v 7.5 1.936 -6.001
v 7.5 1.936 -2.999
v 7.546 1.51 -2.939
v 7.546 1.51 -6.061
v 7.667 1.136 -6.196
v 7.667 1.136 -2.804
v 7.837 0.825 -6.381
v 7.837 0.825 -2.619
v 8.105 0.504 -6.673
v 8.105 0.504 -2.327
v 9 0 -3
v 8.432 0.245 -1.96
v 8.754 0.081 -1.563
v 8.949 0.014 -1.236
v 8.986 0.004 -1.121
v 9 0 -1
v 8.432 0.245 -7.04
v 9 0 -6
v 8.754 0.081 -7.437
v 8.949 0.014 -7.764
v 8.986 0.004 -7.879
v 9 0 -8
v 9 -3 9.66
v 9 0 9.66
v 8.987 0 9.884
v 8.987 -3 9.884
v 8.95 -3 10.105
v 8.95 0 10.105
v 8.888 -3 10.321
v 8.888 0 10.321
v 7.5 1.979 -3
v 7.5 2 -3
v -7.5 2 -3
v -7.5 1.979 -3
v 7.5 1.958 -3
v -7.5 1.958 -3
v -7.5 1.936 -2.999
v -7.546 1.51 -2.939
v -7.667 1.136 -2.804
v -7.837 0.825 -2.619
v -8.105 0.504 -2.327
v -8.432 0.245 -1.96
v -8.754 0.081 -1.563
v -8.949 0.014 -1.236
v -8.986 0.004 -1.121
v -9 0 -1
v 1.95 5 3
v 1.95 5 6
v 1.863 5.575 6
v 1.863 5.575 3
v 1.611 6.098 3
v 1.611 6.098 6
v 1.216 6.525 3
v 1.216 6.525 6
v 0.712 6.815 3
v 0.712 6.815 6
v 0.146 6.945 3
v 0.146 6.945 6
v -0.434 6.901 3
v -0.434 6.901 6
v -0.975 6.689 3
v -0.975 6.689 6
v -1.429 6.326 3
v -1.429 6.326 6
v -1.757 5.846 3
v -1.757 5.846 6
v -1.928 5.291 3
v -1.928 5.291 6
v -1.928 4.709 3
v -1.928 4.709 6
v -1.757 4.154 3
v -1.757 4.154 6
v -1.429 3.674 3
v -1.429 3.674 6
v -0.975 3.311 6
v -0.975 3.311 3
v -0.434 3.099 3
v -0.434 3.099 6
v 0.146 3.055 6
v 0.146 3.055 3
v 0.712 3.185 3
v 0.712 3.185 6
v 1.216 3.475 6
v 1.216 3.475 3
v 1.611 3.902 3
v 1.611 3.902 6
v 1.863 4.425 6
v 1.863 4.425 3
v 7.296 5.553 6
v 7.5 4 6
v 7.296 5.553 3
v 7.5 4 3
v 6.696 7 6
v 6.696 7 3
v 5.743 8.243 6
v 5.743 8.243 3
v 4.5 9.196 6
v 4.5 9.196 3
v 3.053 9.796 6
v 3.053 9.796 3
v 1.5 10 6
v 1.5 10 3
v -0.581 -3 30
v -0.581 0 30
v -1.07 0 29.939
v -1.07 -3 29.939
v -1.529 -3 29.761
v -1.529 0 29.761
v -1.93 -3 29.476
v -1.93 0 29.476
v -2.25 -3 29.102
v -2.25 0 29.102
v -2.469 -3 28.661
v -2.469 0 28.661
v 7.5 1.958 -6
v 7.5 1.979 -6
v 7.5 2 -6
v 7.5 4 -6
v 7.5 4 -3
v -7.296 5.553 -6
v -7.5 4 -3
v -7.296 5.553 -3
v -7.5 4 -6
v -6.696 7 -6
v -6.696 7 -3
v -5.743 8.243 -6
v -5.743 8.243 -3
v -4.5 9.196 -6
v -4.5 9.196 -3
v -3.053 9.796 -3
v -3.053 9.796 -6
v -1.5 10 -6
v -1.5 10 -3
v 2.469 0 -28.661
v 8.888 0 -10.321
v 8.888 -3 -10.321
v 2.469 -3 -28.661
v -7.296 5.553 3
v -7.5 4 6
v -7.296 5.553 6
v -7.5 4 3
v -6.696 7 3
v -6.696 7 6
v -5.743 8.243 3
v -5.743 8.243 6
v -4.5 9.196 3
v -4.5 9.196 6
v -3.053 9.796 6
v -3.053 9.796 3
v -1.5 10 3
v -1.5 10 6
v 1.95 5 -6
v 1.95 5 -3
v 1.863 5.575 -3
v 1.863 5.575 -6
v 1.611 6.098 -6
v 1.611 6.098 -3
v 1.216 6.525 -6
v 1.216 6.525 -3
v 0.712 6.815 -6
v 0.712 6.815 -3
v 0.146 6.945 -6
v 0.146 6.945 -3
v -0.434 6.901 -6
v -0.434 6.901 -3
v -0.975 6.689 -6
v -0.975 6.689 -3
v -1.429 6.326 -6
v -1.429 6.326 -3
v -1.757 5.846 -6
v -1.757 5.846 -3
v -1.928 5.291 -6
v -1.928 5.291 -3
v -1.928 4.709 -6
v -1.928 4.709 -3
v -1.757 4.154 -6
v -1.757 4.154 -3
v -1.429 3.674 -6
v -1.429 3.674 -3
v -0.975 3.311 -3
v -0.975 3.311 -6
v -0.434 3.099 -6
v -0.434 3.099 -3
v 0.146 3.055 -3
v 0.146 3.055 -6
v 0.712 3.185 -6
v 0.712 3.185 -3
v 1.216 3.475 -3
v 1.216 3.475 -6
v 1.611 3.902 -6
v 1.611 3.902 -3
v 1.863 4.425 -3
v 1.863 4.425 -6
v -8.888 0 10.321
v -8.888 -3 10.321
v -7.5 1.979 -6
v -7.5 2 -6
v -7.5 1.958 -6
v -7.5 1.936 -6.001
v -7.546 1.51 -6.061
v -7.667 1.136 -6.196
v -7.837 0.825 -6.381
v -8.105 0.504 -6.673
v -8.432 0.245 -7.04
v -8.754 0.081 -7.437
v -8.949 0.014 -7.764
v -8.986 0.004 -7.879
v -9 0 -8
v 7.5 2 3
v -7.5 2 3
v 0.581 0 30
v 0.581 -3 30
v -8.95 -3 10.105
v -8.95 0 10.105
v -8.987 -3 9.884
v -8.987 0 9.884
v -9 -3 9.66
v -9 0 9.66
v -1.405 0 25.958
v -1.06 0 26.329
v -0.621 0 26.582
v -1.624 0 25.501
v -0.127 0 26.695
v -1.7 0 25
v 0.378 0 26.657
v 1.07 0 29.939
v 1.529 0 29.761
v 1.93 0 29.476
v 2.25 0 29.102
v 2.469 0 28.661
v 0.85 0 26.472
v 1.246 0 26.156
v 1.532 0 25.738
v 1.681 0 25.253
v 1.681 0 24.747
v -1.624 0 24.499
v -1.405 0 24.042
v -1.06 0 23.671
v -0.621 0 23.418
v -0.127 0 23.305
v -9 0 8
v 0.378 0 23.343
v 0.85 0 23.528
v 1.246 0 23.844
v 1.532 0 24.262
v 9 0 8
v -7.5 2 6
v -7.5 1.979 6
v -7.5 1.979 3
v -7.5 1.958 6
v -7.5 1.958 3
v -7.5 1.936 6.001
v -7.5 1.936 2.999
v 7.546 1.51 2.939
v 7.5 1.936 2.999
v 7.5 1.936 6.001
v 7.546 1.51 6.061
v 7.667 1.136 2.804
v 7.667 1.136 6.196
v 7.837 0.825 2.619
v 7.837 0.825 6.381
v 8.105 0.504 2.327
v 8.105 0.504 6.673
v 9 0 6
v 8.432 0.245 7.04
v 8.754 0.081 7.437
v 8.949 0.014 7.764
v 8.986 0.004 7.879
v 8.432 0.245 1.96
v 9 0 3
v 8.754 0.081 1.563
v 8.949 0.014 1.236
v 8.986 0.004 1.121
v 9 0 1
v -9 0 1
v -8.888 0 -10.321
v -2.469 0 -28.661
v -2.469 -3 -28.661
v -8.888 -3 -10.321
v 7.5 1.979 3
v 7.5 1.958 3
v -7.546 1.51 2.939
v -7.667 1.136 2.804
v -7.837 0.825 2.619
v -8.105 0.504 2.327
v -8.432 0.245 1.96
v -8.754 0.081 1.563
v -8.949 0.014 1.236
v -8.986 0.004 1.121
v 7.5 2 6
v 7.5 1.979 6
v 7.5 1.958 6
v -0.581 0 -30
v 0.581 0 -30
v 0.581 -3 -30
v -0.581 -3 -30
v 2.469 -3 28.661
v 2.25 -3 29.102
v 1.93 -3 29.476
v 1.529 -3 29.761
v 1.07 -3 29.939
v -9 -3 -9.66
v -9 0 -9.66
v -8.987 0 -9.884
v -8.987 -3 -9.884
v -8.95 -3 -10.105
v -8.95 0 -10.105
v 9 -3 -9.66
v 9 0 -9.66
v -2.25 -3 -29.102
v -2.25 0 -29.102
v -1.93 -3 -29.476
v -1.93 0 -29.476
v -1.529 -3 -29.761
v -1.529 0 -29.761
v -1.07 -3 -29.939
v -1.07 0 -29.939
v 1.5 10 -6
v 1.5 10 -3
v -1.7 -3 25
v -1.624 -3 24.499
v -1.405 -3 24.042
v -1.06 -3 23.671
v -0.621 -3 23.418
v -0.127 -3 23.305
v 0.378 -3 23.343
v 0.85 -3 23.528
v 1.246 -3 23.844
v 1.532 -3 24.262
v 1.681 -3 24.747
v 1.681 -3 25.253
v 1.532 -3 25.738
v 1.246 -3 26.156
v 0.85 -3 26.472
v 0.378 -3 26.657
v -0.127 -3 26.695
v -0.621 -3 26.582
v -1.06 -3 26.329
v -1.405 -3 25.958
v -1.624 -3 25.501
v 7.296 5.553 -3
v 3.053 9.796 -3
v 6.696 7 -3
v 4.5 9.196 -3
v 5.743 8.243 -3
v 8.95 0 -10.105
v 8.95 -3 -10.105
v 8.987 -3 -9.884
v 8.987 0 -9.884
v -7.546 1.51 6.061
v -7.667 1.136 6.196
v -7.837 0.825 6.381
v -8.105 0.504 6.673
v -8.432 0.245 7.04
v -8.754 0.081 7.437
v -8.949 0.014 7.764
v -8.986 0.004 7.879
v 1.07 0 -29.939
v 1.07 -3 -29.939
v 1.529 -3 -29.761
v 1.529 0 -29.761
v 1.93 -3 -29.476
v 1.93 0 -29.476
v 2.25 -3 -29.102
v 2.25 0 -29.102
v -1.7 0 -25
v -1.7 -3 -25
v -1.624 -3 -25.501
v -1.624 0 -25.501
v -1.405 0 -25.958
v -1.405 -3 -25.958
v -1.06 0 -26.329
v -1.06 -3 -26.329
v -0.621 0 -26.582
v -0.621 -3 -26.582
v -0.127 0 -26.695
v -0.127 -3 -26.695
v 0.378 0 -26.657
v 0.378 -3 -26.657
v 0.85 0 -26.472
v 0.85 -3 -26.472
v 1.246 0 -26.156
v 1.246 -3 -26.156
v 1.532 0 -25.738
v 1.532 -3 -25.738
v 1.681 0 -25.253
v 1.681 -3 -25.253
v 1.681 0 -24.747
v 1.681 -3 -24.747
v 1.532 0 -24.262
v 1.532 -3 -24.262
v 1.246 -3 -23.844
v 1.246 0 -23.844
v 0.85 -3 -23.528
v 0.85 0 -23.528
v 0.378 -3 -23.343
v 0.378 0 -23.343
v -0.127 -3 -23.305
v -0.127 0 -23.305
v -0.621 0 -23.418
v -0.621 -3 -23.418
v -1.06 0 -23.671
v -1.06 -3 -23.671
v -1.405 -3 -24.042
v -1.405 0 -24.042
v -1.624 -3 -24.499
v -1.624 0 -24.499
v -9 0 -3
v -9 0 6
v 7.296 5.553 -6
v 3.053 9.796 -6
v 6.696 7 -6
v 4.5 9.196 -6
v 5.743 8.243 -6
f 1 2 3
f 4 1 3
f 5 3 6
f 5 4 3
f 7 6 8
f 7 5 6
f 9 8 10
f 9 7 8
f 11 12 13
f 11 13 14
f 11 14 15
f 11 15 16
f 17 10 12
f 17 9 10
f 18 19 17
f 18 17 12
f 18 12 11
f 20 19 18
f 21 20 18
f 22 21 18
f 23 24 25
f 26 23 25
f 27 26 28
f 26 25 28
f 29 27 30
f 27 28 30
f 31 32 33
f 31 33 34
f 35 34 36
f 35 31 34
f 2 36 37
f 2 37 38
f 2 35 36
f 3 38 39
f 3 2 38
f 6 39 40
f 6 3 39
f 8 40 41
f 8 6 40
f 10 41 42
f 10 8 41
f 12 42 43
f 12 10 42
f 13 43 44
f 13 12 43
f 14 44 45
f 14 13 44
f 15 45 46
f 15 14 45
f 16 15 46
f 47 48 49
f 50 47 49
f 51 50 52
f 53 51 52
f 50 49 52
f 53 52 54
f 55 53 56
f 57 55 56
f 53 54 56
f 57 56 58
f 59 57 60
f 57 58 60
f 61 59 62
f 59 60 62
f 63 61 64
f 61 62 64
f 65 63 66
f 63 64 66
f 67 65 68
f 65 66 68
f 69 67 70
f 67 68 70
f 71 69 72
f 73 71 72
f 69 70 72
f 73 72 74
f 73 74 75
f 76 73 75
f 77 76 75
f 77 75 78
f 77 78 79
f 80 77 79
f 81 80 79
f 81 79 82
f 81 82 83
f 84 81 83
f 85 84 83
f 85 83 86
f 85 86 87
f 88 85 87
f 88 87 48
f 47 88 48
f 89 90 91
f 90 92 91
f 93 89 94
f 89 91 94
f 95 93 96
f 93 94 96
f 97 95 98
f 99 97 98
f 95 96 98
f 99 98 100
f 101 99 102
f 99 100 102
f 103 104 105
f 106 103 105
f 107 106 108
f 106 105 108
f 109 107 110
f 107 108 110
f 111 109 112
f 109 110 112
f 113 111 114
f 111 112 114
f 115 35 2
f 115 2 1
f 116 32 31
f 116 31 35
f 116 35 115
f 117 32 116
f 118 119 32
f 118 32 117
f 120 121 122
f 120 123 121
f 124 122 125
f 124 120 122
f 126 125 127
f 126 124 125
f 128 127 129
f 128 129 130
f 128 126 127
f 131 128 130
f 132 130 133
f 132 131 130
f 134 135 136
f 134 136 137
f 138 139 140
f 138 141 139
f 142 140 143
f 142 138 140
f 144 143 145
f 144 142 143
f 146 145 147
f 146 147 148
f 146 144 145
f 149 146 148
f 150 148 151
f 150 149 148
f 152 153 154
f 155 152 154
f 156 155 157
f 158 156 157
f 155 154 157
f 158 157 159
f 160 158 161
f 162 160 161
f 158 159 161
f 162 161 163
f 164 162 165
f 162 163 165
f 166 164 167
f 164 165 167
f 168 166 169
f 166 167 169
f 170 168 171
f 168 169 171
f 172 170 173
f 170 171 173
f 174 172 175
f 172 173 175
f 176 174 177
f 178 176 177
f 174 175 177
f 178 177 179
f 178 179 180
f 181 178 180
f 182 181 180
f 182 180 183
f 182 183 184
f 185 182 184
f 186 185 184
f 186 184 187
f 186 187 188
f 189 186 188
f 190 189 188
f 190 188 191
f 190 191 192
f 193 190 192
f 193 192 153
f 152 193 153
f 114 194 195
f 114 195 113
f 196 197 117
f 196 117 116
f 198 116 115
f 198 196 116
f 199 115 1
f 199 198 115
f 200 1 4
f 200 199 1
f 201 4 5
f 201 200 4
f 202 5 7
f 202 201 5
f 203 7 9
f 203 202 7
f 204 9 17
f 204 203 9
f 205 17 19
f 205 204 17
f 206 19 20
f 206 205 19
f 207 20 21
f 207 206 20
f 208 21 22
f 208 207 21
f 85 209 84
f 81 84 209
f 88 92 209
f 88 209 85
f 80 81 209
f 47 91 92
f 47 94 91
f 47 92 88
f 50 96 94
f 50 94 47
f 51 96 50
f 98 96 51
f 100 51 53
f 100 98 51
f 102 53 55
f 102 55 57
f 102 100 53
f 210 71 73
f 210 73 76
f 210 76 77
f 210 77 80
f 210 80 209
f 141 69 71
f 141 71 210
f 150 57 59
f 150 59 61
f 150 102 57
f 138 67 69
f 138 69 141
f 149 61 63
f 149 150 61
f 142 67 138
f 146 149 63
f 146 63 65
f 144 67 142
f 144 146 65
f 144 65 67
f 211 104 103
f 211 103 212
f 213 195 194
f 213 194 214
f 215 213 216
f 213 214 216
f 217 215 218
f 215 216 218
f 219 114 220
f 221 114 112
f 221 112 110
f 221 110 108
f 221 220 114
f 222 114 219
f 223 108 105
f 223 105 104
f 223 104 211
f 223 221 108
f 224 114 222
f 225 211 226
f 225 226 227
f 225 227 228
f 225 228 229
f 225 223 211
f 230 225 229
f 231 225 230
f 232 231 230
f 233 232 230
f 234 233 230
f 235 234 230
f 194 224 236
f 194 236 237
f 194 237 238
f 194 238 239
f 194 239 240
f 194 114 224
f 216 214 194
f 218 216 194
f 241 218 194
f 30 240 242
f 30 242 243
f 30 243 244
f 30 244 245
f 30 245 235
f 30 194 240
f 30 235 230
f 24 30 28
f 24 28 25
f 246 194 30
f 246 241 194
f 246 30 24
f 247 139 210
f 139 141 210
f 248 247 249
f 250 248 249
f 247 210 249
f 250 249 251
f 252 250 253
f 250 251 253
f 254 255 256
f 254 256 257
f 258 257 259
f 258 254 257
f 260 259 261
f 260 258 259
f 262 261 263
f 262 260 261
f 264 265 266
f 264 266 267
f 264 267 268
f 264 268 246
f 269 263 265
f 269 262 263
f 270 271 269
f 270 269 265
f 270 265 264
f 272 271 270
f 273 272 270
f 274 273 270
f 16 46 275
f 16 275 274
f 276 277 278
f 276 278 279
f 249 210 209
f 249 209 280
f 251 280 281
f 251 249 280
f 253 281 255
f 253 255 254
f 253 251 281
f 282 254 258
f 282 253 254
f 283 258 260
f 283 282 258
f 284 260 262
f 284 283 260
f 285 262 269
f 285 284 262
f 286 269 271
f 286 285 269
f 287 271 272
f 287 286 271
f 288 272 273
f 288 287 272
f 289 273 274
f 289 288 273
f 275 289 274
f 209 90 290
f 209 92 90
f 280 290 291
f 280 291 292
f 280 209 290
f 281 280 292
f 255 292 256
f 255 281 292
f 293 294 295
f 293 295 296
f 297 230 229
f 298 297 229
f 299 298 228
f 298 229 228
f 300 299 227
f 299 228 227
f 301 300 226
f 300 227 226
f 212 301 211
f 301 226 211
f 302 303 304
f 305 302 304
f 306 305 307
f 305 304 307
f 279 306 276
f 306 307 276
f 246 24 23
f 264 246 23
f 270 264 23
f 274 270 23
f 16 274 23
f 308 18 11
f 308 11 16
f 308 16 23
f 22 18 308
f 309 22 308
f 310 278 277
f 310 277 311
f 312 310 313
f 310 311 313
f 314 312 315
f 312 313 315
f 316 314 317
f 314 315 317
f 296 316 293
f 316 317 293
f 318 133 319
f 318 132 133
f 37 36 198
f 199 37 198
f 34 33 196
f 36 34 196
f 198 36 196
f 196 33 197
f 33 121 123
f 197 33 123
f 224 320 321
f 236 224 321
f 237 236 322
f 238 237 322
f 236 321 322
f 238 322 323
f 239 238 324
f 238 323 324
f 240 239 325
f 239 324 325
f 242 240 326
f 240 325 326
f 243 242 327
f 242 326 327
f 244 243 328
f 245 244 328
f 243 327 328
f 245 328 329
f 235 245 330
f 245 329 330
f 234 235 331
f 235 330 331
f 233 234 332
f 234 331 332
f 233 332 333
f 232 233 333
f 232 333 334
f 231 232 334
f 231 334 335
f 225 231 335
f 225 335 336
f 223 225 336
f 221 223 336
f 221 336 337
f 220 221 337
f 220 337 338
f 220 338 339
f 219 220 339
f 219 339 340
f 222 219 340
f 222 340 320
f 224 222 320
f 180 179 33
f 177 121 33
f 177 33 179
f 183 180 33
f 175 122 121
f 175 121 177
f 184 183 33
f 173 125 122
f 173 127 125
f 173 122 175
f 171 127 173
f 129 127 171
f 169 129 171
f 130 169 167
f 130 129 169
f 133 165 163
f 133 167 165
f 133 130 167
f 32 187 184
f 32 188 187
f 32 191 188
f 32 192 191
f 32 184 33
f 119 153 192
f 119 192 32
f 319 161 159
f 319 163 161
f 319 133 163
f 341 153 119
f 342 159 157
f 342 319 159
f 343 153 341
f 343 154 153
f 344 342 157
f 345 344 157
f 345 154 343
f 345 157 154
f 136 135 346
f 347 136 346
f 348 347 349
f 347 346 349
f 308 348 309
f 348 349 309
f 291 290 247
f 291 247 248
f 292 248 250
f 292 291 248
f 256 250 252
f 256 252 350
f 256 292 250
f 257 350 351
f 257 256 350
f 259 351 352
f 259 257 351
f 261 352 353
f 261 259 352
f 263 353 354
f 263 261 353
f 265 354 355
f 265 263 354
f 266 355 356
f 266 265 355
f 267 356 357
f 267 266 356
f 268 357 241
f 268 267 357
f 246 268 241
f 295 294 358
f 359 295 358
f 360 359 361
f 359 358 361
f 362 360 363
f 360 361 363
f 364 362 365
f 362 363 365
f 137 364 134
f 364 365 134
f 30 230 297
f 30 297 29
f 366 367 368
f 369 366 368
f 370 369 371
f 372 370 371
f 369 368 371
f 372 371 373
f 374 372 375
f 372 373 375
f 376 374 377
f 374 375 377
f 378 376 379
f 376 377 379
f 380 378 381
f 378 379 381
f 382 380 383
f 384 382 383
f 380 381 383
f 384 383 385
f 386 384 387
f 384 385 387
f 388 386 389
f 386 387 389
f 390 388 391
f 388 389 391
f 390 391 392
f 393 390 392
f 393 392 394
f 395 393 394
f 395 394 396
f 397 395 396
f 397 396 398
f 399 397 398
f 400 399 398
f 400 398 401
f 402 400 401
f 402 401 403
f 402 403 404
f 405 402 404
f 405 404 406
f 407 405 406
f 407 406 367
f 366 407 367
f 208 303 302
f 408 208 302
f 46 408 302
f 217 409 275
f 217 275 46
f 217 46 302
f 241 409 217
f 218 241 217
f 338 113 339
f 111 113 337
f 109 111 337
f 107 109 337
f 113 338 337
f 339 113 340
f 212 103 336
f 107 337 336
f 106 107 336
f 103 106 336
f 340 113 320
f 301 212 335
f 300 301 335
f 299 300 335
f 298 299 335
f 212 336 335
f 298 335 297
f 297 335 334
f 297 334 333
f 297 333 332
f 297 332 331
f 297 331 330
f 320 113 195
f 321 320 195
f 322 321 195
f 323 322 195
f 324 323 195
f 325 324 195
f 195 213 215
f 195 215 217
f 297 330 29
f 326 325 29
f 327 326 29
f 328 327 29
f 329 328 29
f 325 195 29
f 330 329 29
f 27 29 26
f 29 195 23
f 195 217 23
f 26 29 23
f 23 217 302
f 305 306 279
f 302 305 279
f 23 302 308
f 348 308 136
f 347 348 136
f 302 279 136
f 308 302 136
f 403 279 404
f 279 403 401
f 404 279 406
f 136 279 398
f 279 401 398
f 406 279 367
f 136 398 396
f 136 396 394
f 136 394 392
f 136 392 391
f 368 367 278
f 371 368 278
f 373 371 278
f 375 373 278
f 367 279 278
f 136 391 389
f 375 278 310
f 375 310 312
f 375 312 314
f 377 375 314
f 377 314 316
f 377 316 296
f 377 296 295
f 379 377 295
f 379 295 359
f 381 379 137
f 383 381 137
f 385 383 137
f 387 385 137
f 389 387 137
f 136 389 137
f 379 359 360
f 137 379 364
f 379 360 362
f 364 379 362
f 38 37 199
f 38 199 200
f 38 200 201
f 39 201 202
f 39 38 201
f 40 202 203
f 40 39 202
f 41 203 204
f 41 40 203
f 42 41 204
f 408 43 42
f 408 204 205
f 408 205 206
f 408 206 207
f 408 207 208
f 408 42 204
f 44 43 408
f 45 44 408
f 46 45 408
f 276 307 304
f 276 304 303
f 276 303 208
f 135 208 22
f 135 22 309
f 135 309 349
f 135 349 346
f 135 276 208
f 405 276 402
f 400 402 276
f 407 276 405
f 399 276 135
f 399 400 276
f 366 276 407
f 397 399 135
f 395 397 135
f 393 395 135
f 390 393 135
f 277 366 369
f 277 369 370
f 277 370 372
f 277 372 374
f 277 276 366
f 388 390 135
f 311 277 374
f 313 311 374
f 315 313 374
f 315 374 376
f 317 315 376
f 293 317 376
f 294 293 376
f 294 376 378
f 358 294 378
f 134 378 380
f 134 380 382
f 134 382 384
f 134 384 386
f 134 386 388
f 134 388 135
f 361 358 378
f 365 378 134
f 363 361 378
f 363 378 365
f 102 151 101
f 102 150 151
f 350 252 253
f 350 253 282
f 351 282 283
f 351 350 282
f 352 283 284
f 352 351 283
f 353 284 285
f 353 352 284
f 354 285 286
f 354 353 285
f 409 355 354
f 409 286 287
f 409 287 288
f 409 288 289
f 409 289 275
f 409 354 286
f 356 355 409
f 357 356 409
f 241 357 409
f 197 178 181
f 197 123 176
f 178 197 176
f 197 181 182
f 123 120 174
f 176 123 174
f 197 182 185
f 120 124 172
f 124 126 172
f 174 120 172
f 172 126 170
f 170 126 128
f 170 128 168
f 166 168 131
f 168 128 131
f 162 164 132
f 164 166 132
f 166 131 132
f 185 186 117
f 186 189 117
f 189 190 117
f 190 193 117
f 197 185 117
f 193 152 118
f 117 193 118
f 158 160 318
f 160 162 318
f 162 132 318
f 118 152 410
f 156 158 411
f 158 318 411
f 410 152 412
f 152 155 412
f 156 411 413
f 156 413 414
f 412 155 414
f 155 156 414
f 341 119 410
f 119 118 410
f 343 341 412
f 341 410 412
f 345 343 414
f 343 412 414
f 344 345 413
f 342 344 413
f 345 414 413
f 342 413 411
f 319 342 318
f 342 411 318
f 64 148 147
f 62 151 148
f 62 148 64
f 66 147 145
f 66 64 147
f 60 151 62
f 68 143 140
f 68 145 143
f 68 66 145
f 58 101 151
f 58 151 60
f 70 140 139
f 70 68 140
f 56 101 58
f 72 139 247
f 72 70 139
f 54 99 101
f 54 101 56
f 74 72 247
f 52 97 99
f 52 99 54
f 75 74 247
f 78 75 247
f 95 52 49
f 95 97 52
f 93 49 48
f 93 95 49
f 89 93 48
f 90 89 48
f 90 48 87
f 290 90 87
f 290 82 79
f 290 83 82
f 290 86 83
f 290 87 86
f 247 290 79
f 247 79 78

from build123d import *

# Parameters (mm, degrees)
EXTRUDE_1_DEPTH      = 3
SKETCH_2_W           = 15
SKETCH_2_H           = 3
EXTRUDE_2_DEPTH      = 10
FILLET_1_R           = 6
FILLET_2_R           = 2
HOLE_WIZARD_M3_1_D   = 3.4
HOLE_WIZARD_M3_5_1_D = 3.9


with BuildPart() as part:
    # 草图1 → 凸台-拉伸1 (new body)
    with BuildSketch(Plane(origin=(0, 0, 0), x_dir=(1, 0, 0), z_dir=(0, 1, 0))):
        Polygon((9, 10), (2, 30), (-2, 30), (-9, 10), (-9, -10), (-2, -30), (2, -30), (9, -10), align=None)
    extrude(amount=-EXTRUDE_1_DEPTH)

    # 草图2 → 凸台-拉伸2 (add)
    with BuildSketch(Plane(origin=(0, 0, 0), x_dir=(1, 0, 0), z_dir=(0, 1, 0))):
        with Locations((0, 4.5)):
            Rectangle(SKETCH_2_W, SKETCH_2_H)
        with Locations((0, -4.5)):
            Rectangle(SKETCH_2_W, SKETCH_2_H)
    extrude(amount=EXTRUDE_2_DEPTH)

    # 圆角1
    fillet_1_edges = [part.edges().sort_by_distance(p)[0] for p in [
        (-7.5, 10, -4.5),
        (7.5, 10, -4.5),
        (-7.5, 10, 4.5),
        (7.5, 10, 4.5),
    ]]
    fillet(fillet_1_edges, radius=FILLET_1_R)

    # 圆角2
    # the kernel refuses this fillet: 2 mm, written as the material it adds along each edge
    with BuildSketch(Plane(origin=(-7.5, 0, -3), x_dir=(-1, 0, 0), z_dir=(0, 0, -1)), Plane(origin=(7.5, 0, -6), x_dir=(1, 0, 0), z_dir=(0, 0, 1)), Plane(origin=(7.5, 0, 3), x_dir=(1, 0, 0), z_dir=(0, 0, 1))) as fillet_2_piece_1:
        with BuildLine():
            CenterArc((2, 1.936491673), FILLET_2_R, 180, 75.522487814)
            Line((0, 1.936491673), (0, 0))
            Line((0, 0), (1.5, 0))
        make_face()
    extrude(amount=3)
    with BuildSketch(Plane(origin=(7.5, 0, -3), x_dir=(0, 0, 1), z_dir=(-1, 0, 0)), Plane(origin=(-7.5, 0, -6), x_dir=(0, 0, -1), z_dir=(1, 0, 0)), Plane(origin=(-7.5, 0, 3), x_dir=(0, 0, -1), z_dir=(1, 0, 0))) as fillet_2_piece_2:
        with BuildLine():
            CenterArc((FILLET_2_R, FILLET_2_R), FILLET_2_R, 180, 90)
            Line((0, FILLET_2_R), (0, 0))
            Line((0, 0), (FILLET_2_R, 0))
        make_face()
    extrude(amount=15)
    with BuildSketch(Plane(origin=(-7.5, 0, 6), x_dir=(0, 1, 0), z_dir=(0, 0, -1))) as fillet_2_piece_3:
        with BuildLine():
            CenterArc((1.936491673, -2), FILLET_2_R, 90, 75.522487814)
            Line((0, -1.5), (0, 0))
            Line((0, 0), (1.936491673, 0))
        make_face()
    extrude(amount=3)
    with BuildSketch(Plane(origin=(7.5, 0, 6), x_dir=(0, 1, 0), z_dir=(-1, 0, 0))) as fillet_2_piece_4:
        with BuildLine():
            CenterArc((FILLET_2_R, -FILLET_2_R), FILLET_2_R, 90, 90)
            Line((0, -FILLET_2_R), (0, 0))
            Line((0, 0), (FILLET_2_R, 0))
        make_face()
    extrude(amount=15)
    with BuildSketch(Plane(origin=(-7.5, 0, 1.841229183), x_dir=(-1, 0, 0), z_dir=(0, 0, -1))) as fillet_2_piece_5a_section:
        with BuildLine():
            CenterArc((2, 1.936491673), FILLET_2_R, 180, 75.522487814)
            Line((0, 1.936491673), (0, 0))
            Line((0, 0), (1.5, 0))
        make_face()
    fillet_2_piece_5a = extrude(amount=7.841229183, mode=Mode.PRIVATE)
    fillet_2_piece_5a = split(fillet_2_piece_5a, bisect_by=Plane(origin=(-7.5, 0, -3), z_dir=(0, 0, 1)), keep=Keep.TOP, mode=Mode.PRIVATE)
    with BuildSketch(Plane(origin=(7.5, 0, -3), x_dir=(0, 0, 1), z_dir=(-1, 0, 0))) as fillet_2_piece_5b_section:
        with BuildLine():
            CenterArc((FILLET_2_R, FILLET_2_R), FILLET_2_R, 180, 90)
            Line((0, FILLET_2_R), (0, 0))
            Line((0, 0), (FILLET_2_R, 0))
        make_face()
    fillet_2_piece_5b = extrude(amount=20, mode=Mode.PRIVATE)
    fillet_2_piece_5b = split(fillet_2_piece_5b, bisect_by=Plane(origin=(-9, 0, -3), z_dir=(1, 0, 0)), keep=Keep.TOP, mode=Mode.PRIVATE)
    fillet_2_piece_5b = split(fillet_2_piece_5b, bisect_by=Plane(origin=(-7.5, 0, -3), z_dir=(-1, 0, 0)), keep=Keep.TOP, mode=Mode.PRIVATE)
    fillet_2_piece_5 = fillet_2_piece_5a & fillet_2_piece_5b
    add(fillet_2_piece_5)
    with BuildSketch(Plane(origin=(-7.5, 0, -3), x_dir=(-1, 0, 0), z_dir=(0, 0, -1))) as fillet_2_piece_6a_section:
        with BuildLine():
            CenterArc((2, 1.936491673), FILLET_2_R, 180, 75.522487814)
            Line((0, 1.936491673), (0, 0))
            Line((0, 0), (1.5, 0))
        make_face()
    fillet_2_piece_6a = extrude(amount=7.841229183, mode=Mode.PRIVATE)
    fillet_2_piece_6a = split(fillet_2_piece_6a, bisect_by=Plane(origin=(-11.018930958, 0, -4.231625835), z_dir=(0.9438583563660174, 0, 0.3303504247281063)), keep=Keep.TOP, mode=Mode.PRIVATE)
    fillet_2_piece_6a = split(fillet_2_piece_6a, bisect_by=Plane(origin=(-7.5, 0, -6), z_dir=(0, 0, -1)), keep=Keep.TOP, mode=Mode.PRIVATE)
    with BuildSketch(Plane(origin=(-12.5, 0, -6), x_dir=(0, 0, -1), z_dir=(1, 0, 0))) as fillet_2_piece_6b_section:
        with BuildLine():
            CenterArc((FILLET_2_R, FILLET_2_R), FILLET_2_R, 180, 90)
            Line((0, FILLET_2_R), (0, 0))
            Line((0, 0), (FILLET_2_R, 0))
        make_face()
    fillet_2_piece_6b = extrude(amount=20, mode=Mode.PRIVATE)
    fillet_2_piece_6b = split(fillet_2_piece_6b, bisect_by=Plane(origin=(-9, 0, -6), z_dir=(1, 0, 0)), keep=Keep.TOP, mode=Mode.PRIVATE)
    fillet_2_piece_6b = split(fillet_2_piece_6b, bisect_by=Plane(origin=(-7.5, 0, -6), z_dir=(-1, 0, 0)), keep=Keep.TOP, mode=Mode.PRIVATE)
    fillet_2_piece_6 = fillet_2_piece_6a & fillet_2_piece_6b
    add(fillet_2_piece_6)
    with BuildSketch(Plane(origin=(12.5, 0, -3), x_dir=(0, 0, 1), z_dir=(-1, 0, 0))) as fillet_2_piece_7a_section:
        with BuildLine():
            CenterArc((FILLET_2_R, FILLET_2_R), FILLET_2_R, 180, 90)
            Line((0, FILLET_2_R), (0, 0))
            Line((0, 0), (FILLET_2_R, 0))
        make_face()
    fillet_2_piece_7a = extrude(amount=20, mode=Mode.PRIVATE)
    fillet_2_piece_7a = split(fillet_2_piece_7a, bisect_by=Plane(origin=(9, 0, -3), z_dir=(-1, 0, 0)), keep=Keep.TOP, mode=Mode.PRIVATE)
    fillet_2_piece_7a = split(fillet_2_piece_7a, bisect_by=Plane(origin=(7.5, 0, -3), z_dir=(1, 0, 0)), keep=Keep.TOP, mode=Mode.PRIVATE)
    with BuildSketch(Plane(origin=(7.5, 0, -6), x_dir=(1, 0, 0), z_dir=(0, 0, 1))) as fillet_2_piece_7b_section:
        with BuildLine():
            CenterArc((2, 1.936491673), FILLET_2_R, 180, 75.522487814)
            Line((0, 1.936491673), (0, 0))
            Line((0, 0), (1.5, 0))
        make_face()
    fillet_2_piece_7b = extrude(amount=7.841229183, mode=Mode.PRIVATE)
    fillet_2_piece_7b = split(fillet_2_piece_7b, bisect_by=Plane(origin=(7.5, 0, -3), z_dir=(0, 0, 1)), keep=Keep.TOP, mode=Mode.PRIVATE)
    fillet_2_piece_7 = fillet_2_piece_7a & fillet_2_piece_7b
    add(fillet_2_piece_7)
    with BuildSketch(Plane(origin=(7.5, 0, -10.841229183), x_dir=(1, 0, 0), z_dir=(0, 0, 1))) as fillet_2_piece_8a_section:
        with BuildLine():
            CenterArc((2, 1.936491673), FILLET_2_R, 180, 75.522487814)
            Line((0, 1.936491673), (0, 0))
            Line((0, 0), (1.5, 0))
        make_face()
    fillet_2_piece_8a = extrude(amount=7.841229183, mode=Mode.PRIVATE)
    fillet_2_piece_8a = split(fillet_2_piece_8a, bisect_by=Plane(origin=(8.574004264, 0, -11.217130675), z_dir=(-0.9438583563660174, 0, 0.3303504247281061)), keep=Keep.TOP, mode=Mode.PRIVATE)
    fillet_2_piece_8a = split(fillet_2_piece_8a, bisect_by=Plane(origin=(7.5, 0, -6), z_dir=(0, 0, -1)), keep=Keep.TOP, mode=Mode.PRIVATE)
    with BuildSketch(Plane(origin=(-7.5, 0, -6), x_dir=(0, 0, -1), z_dir=(1, 0, 0))) as fillet_2_piece_8b_section:
        with BuildLine():
            CenterArc((FILLET_2_R, FILLET_2_R), FILLET_2_R, 180, 90)
            Line((0, FILLET_2_R), (0, 0))
            Line((0, 0), (FILLET_2_R, 0))
        make_face()
    fillet_2_piece_8b = extrude(amount=20, mode=Mode.PRIVATE)
    fillet_2_piece_8b = split(fillet_2_piece_8b, bisect_by=Plane(origin=(9, 0, -6), z_dir=(-1, 0, 0)), keep=Keep.TOP, mode=Mode.PRIVATE)
    fillet_2_piece_8b = split(fillet_2_piece_8b, bisect_by=Plane(origin=(7.5, 0, -6), z_dir=(1, 0, 0)), keep=Keep.TOP, mode=Mode.PRIVATE)
    fillet_2_piece_8 = fillet_2_piece_8a & fillet_2_piece_8b
    add(fillet_2_piece_8)
    with BuildSketch(Plane(origin=(-7.5, 0, 10.841229183), x_dir=(0, 1, 0), z_dir=(0, 0, -1))) as fillet_2_piece_9a_section:
        with BuildLine():
            CenterArc((1.936491673, -2), FILLET_2_R, 90, 75.522487814)
            Line((0, -1.5), (0, 0))
            Line((0, 0), (1.936491673, 0))
        make_face()
    fillet_2_piece_9a = extrude(amount=7.841229183, mode=Mode.PRIVATE)
    fillet_2_piece_9a = split(fillet_2_piece_9a, bisect_by=Plane(origin=(-7.5, 0, 6), z_dir=(0, 0, 1)), keep=Keep.TOP, mode=Mode.PRIVATE)
    fillet_2_piece_9a = split(fillet_2_piece_9a, bisect_by=Plane(origin=(-8.574004264, 0, 11.217130675), z_dir=(0.9438583563660174, 0, -0.33035042472810616)), keep=Keep.TOP, mode=Mode.PRIVATE)
    with BuildSketch(Plane(origin=(7.5, 0, 6), x_dir=(0, 1, 0), z_dir=(-1, 0, 0))) as fillet_2_piece_9b_section:
        with BuildLine():
            CenterArc((FILLET_2_R, -FILLET_2_R), FILLET_2_R, 90, 90)
            Line((0, -FILLET_2_R), (0, 0))
            Line((0, 0), (FILLET_2_R, 0))
        make_face()
    fillet_2_piece_9b = extrude(amount=20, mode=Mode.PRIVATE)
    fillet_2_piece_9b = split(fillet_2_piece_9b, bisect_by=Plane(origin=(-7.5, 0, 6), z_dir=(-1, 0, 0)), keep=Keep.TOP, mode=Mode.PRIVATE)
    fillet_2_piece_9b = split(fillet_2_piece_9b, bisect_by=Plane(origin=(-9, 0, 6), z_dir=(1, 0, 0)), keep=Keep.TOP, mode=Mode.PRIVATE)
    fillet_2_piece_9 = fillet_2_piece_9a & fillet_2_piece_9b
    add(fillet_2_piece_9)
    with BuildSketch(Plane(origin=(-7.5, 0, 6), x_dir=(0, 1, 0), z_dir=(0, 0, -1))) as fillet_2_piece_10a_section:
        with BuildLine():
            CenterArc((1.936491673, -2), FILLET_2_R, 90, 75.522487814)
            Line((0, -1.5), (0, 0))
            Line((0, 0), (1.936491673, 0))
        make_face()
    fillet_2_piece_10a = extrude(amount=7.841229183, mode=Mode.PRIVATE)
    fillet_2_piece_10a = split(fillet_2_piece_10a, bisect_by=Plane(origin=(-7.5, 0, 3), z_dir=(0, 0, -1)), keep=Keep.TOP, mode=Mode.PRIVATE)
    with BuildSketch(Plane(origin=(-12.5, 0, 3), x_dir=(0, 0, -1), z_dir=(1, 0, 0))) as fillet_2_piece_10b_section:
        with BuildLine():
            CenterArc((FILLET_2_R, FILLET_2_R), FILLET_2_R, 180, 90)
            Line((0, FILLET_2_R), (0, 0))
            Line((0, 0), (FILLET_2_R, 0))
        make_face()
    fillet_2_piece_10b = extrude(amount=20, mode=Mode.PRIVATE)
    fillet_2_piece_10b = split(fillet_2_piece_10b, bisect_by=Plane(origin=(-7.5, 0, 3), z_dir=(-1, 0, 0)), keep=Keep.TOP, mode=Mode.PRIVATE)
    fillet_2_piece_10b = split(fillet_2_piece_10b, bisect_by=Plane(origin=(-9, 0, 3), z_dir=(1, 0, 0)), keep=Keep.TOP, mode=Mode.PRIVATE)
    fillet_2_piece_10 = fillet_2_piece_10a & fillet_2_piece_10b
    add(fillet_2_piece_10)
    with BuildSketch(Plane(origin=(12.5, 0, 6), x_dir=(0, 1, 0), z_dir=(-1, 0, 0))) as fillet_2_piece_11a_section:
        with BuildLine():
            CenterArc((FILLET_2_R, -FILLET_2_R), FILLET_2_R, 90, 90)
            Line((0, -FILLET_2_R), (0, 0))
            Line((0, 0), (FILLET_2_R, 0))
        make_face()
    fillet_2_piece_11a = extrude(amount=20, mode=Mode.PRIVATE)
    fillet_2_piece_11a = split(fillet_2_piece_11a, bisect_by=Plane(origin=(7.5, 0, 6), z_dir=(1, 0, 0)), keep=Keep.TOP, mode=Mode.PRIVATE)
    fillet_2_piece_11a = split(fillet_2_piece_11a, bisect_by=Plane(origin=(9, 0, 6), z_dir=(-1, 0, 0)), keep=Keep.TOP, mode=Mode.PRIVATE)
    with BuildSketch(Plane(origin=(7.5, 0, 3), x_dir=(1, 0, 0), z_dir=(0, 0, 1))) as fillet_2_piece_11b_section:
        with BuildLine():
            CenterArc((2, 1.936491673), FILLET_2_R, 180, 75.522487814)
            Line((0, 1.936491673), (0, 0))
            Line((0, 0), (1.5, 0))
        make_face()
    fillet_2_piece_11b = extrude(amount=7.841229183, mode=Mode.PRIVATE)
    fillet_2_piece_11b = split(fillet_2_piece_11b, bisect_by=Plane(origin=(7.5, 0, 6), z_dir=(0, 0, 1)), keep=Keep.TOP, mode=Mode.PRIVATE)
    fillet_2_piece_11b = split(fillet_2_piece_11b, bisect_by=Plane(origin=(11.018930958, 0, 4.231625835), z_dir=(-0.9438583563660174, 0, -0.33035042472810605)), keep=Keep.TOP, mode=Mode.PRIVATE)
    fillet_2_piece_11 = fillet_2_piece_11a & fillet_2_piece_11b
    add(fillet_2_piece_11)
    with BuildSketch(Plane(origin=(7.5, 0, -1.841229183), x_dir=(1, 0, 0), z_dir=(0, 0, 1))) as fillet_2_piece_12a_section:
        with BuildLine():
            CenterArc((2, 1.936491673), FILLET_2_R, 180, 75.522487814)
            Line((0, 1.936491673), (0, 0))
            Line((0, 0), (1.5, 0))
        make_face()
    fillet_2_piece_12a = extrude(amount=7.841229183, mode=Mode.PRIVATE)
    fillet_2_piece_12a = split(fillet_2_piece_12a, bisect_by=Plane(origin=(7.5, 0, 3), z_dir=(0, 0, -1)), keep=Keep.TOP, mode=Mode.PRIVATE)
    with BuildSketch(Plane(origin=(-7.5, 0, 3), x_dir=(0, 0, -1), z_dir=(1, 0, 0))) as fillet_2_piece_12b_section:
        with BuildLine():
            CenterArc((FILLET_2_R, FILLET_2_R), FILLET_2_R, 180, 90)
            Line((0, FILLET_2_R), (0, 0))
            Line((0, 0), (FILLET_2_R, 0))
        make_face()
    fillet_2_piece_12b = extrude(amount=20, mode=Mode.PRIVATE)
    fillet_2_piece_12b = split(fillet_2_piece_12b, bisect_by=Plane(origin=(7.5, 0, 3), z_dir=(1, 0, 0)), keep=Keep.TOP, mode=Mode.PRIVATE)
    fillet_2_piece_12b = split(fillet_2_piece_12b, bisect_by=Plane(origin=(9, 0, 3), z_dir=(-1, 0, 0)), keep=Keep.TOP, mode=Mode.PRIVATE)
    fillet_2_piece_12 = fillet_2_piece_12a & fillet_2_piece_12b
    add(fillet_2_piece_12)
    # the kernel refuses this fillet: 2 mm, written as the material it takes off along each edge
    with BuildSketch(Plane(origin=(-2, 3.547405025, -30), x_dir=(1, 0, 0), z_dir=(0, -1, 0))) as fillet_2_2_piece_1:
        with BuildLine():
            CenterArc((FILLET_2_R * 0.709481005021, FILLET_2_R), FILLET_2_R, 199.290046219, 70.709953781)
            Line((-FILLET_2_R * 0.234377351345, FILLET_2_R * 0.669649575272), (0, 0))
            Line((0, 0), (FILLET_2_R * 0.709481005021, 0))
        make_face()
    extrude(amount=10.09481005, mode=Mode.SUBTRACT)
    with BuildSketch(Plane(origin=(2, 3.547405025, -30), x_dir=(-1, 0, 0), z_dir=(0, -1, 0)), Plane(origin=(2, 3.547405025, 30), x_dir=(0.3303504247281063, 0, -0.9438583563660173), z_dir=(0, -1, 0)), Plane(origin=(-2, 3.547405025, 30), x_dir=(1, 0, 0), z_dir=(0, -1, 0))) as fillet_2_2_piece_2:
        with BuildLine():
            CenterArc((FILLET_2_R * 0.709481005021, -FILLET_2_R), FILLET_2_R, 90, 70.709953781)
            Line((-FILLET_2_R * 0.234377351345, -FILLET_2_R * 0.669649575272), (0, 0))
            Line((0, 0), (FILLET_2_R * 0.709481005021, 0))
        make_face()
    extrude(amount=10.09481005, mode=Mode.SUBTRACT)
    with BuildSketch(Plane(origin=(9, 0.849728643, -10), x_dir=(-0.330350424728111, 0, -0.9438583563660158), z_dir=(0, -1, 0)), Plane(origin=(9, 0.849728643, 10), x_dir=(0, 0, -1), z_dir=(0, -1, 0)), Plane(origin=(-9, 0.849728643, -10), x_dir=(0, 0, 1), z_dir=(0, -1, 0))) as fillet_2_2_piece_3:
        with BuildLine():
            CenterArc((FILLET_2_R * 0.169945728631, -FILLET_2_R), FILLET_2_R, 90, 19.290046219)
            Line((-FILLET_2_R * 0.160404696097, -FILLET_2_R * 0.056141643634), (0, 0))
            Line((0, 0), (FILLET_2_R * 0.169945728631, 0))
        make_face()
    extrude(amount=4.699457286, mode=Mode.SUBTRACT)
    with BuildSketch(Plane(origin=(-9, 0.849728643, 10), x_dir=(0, 0, -1), z_dir=(0, -1, 0))) as fillet_2_2_piece_4:
        with BuildLine():
            CenterArc((FILLET_2_R * 0.169945728631, FILLET_2_R), FILLET_2_R, 250.709953781, 19.290046219)
            Line((-FILLET_2_R * 0.160404696097, FILLET_2_R * 0.056141643634), (0, 0))
            Line((0, 0), (FILLET_2_R * 0.169945728631, 0))
        make_face()
    extrude(amount=4.699457286, mode=Mode.SUBTRACT)

    # M3 间隙孔1 (through all)
    with Locations(Plane(origin=(0, 0, 0), x_dir=(1, 0, 0), z_dir=(0, 1, 0))):
        with Locations((0, 25), (0, -25)):
            Hole(HOLE_WIZARD_M3_1_D / 2)

    # M3.5 间隙孔1 (through all)
    with Locations(Plane(origin=(0, 0, -6), x_dir=(-1, 0, 0), z_dir=(0, 0, -1))):
        with Locations((0, 5)):
            Hole(HOLE_WIZARD_M3_5_1_D / 2)


solid = part.part
